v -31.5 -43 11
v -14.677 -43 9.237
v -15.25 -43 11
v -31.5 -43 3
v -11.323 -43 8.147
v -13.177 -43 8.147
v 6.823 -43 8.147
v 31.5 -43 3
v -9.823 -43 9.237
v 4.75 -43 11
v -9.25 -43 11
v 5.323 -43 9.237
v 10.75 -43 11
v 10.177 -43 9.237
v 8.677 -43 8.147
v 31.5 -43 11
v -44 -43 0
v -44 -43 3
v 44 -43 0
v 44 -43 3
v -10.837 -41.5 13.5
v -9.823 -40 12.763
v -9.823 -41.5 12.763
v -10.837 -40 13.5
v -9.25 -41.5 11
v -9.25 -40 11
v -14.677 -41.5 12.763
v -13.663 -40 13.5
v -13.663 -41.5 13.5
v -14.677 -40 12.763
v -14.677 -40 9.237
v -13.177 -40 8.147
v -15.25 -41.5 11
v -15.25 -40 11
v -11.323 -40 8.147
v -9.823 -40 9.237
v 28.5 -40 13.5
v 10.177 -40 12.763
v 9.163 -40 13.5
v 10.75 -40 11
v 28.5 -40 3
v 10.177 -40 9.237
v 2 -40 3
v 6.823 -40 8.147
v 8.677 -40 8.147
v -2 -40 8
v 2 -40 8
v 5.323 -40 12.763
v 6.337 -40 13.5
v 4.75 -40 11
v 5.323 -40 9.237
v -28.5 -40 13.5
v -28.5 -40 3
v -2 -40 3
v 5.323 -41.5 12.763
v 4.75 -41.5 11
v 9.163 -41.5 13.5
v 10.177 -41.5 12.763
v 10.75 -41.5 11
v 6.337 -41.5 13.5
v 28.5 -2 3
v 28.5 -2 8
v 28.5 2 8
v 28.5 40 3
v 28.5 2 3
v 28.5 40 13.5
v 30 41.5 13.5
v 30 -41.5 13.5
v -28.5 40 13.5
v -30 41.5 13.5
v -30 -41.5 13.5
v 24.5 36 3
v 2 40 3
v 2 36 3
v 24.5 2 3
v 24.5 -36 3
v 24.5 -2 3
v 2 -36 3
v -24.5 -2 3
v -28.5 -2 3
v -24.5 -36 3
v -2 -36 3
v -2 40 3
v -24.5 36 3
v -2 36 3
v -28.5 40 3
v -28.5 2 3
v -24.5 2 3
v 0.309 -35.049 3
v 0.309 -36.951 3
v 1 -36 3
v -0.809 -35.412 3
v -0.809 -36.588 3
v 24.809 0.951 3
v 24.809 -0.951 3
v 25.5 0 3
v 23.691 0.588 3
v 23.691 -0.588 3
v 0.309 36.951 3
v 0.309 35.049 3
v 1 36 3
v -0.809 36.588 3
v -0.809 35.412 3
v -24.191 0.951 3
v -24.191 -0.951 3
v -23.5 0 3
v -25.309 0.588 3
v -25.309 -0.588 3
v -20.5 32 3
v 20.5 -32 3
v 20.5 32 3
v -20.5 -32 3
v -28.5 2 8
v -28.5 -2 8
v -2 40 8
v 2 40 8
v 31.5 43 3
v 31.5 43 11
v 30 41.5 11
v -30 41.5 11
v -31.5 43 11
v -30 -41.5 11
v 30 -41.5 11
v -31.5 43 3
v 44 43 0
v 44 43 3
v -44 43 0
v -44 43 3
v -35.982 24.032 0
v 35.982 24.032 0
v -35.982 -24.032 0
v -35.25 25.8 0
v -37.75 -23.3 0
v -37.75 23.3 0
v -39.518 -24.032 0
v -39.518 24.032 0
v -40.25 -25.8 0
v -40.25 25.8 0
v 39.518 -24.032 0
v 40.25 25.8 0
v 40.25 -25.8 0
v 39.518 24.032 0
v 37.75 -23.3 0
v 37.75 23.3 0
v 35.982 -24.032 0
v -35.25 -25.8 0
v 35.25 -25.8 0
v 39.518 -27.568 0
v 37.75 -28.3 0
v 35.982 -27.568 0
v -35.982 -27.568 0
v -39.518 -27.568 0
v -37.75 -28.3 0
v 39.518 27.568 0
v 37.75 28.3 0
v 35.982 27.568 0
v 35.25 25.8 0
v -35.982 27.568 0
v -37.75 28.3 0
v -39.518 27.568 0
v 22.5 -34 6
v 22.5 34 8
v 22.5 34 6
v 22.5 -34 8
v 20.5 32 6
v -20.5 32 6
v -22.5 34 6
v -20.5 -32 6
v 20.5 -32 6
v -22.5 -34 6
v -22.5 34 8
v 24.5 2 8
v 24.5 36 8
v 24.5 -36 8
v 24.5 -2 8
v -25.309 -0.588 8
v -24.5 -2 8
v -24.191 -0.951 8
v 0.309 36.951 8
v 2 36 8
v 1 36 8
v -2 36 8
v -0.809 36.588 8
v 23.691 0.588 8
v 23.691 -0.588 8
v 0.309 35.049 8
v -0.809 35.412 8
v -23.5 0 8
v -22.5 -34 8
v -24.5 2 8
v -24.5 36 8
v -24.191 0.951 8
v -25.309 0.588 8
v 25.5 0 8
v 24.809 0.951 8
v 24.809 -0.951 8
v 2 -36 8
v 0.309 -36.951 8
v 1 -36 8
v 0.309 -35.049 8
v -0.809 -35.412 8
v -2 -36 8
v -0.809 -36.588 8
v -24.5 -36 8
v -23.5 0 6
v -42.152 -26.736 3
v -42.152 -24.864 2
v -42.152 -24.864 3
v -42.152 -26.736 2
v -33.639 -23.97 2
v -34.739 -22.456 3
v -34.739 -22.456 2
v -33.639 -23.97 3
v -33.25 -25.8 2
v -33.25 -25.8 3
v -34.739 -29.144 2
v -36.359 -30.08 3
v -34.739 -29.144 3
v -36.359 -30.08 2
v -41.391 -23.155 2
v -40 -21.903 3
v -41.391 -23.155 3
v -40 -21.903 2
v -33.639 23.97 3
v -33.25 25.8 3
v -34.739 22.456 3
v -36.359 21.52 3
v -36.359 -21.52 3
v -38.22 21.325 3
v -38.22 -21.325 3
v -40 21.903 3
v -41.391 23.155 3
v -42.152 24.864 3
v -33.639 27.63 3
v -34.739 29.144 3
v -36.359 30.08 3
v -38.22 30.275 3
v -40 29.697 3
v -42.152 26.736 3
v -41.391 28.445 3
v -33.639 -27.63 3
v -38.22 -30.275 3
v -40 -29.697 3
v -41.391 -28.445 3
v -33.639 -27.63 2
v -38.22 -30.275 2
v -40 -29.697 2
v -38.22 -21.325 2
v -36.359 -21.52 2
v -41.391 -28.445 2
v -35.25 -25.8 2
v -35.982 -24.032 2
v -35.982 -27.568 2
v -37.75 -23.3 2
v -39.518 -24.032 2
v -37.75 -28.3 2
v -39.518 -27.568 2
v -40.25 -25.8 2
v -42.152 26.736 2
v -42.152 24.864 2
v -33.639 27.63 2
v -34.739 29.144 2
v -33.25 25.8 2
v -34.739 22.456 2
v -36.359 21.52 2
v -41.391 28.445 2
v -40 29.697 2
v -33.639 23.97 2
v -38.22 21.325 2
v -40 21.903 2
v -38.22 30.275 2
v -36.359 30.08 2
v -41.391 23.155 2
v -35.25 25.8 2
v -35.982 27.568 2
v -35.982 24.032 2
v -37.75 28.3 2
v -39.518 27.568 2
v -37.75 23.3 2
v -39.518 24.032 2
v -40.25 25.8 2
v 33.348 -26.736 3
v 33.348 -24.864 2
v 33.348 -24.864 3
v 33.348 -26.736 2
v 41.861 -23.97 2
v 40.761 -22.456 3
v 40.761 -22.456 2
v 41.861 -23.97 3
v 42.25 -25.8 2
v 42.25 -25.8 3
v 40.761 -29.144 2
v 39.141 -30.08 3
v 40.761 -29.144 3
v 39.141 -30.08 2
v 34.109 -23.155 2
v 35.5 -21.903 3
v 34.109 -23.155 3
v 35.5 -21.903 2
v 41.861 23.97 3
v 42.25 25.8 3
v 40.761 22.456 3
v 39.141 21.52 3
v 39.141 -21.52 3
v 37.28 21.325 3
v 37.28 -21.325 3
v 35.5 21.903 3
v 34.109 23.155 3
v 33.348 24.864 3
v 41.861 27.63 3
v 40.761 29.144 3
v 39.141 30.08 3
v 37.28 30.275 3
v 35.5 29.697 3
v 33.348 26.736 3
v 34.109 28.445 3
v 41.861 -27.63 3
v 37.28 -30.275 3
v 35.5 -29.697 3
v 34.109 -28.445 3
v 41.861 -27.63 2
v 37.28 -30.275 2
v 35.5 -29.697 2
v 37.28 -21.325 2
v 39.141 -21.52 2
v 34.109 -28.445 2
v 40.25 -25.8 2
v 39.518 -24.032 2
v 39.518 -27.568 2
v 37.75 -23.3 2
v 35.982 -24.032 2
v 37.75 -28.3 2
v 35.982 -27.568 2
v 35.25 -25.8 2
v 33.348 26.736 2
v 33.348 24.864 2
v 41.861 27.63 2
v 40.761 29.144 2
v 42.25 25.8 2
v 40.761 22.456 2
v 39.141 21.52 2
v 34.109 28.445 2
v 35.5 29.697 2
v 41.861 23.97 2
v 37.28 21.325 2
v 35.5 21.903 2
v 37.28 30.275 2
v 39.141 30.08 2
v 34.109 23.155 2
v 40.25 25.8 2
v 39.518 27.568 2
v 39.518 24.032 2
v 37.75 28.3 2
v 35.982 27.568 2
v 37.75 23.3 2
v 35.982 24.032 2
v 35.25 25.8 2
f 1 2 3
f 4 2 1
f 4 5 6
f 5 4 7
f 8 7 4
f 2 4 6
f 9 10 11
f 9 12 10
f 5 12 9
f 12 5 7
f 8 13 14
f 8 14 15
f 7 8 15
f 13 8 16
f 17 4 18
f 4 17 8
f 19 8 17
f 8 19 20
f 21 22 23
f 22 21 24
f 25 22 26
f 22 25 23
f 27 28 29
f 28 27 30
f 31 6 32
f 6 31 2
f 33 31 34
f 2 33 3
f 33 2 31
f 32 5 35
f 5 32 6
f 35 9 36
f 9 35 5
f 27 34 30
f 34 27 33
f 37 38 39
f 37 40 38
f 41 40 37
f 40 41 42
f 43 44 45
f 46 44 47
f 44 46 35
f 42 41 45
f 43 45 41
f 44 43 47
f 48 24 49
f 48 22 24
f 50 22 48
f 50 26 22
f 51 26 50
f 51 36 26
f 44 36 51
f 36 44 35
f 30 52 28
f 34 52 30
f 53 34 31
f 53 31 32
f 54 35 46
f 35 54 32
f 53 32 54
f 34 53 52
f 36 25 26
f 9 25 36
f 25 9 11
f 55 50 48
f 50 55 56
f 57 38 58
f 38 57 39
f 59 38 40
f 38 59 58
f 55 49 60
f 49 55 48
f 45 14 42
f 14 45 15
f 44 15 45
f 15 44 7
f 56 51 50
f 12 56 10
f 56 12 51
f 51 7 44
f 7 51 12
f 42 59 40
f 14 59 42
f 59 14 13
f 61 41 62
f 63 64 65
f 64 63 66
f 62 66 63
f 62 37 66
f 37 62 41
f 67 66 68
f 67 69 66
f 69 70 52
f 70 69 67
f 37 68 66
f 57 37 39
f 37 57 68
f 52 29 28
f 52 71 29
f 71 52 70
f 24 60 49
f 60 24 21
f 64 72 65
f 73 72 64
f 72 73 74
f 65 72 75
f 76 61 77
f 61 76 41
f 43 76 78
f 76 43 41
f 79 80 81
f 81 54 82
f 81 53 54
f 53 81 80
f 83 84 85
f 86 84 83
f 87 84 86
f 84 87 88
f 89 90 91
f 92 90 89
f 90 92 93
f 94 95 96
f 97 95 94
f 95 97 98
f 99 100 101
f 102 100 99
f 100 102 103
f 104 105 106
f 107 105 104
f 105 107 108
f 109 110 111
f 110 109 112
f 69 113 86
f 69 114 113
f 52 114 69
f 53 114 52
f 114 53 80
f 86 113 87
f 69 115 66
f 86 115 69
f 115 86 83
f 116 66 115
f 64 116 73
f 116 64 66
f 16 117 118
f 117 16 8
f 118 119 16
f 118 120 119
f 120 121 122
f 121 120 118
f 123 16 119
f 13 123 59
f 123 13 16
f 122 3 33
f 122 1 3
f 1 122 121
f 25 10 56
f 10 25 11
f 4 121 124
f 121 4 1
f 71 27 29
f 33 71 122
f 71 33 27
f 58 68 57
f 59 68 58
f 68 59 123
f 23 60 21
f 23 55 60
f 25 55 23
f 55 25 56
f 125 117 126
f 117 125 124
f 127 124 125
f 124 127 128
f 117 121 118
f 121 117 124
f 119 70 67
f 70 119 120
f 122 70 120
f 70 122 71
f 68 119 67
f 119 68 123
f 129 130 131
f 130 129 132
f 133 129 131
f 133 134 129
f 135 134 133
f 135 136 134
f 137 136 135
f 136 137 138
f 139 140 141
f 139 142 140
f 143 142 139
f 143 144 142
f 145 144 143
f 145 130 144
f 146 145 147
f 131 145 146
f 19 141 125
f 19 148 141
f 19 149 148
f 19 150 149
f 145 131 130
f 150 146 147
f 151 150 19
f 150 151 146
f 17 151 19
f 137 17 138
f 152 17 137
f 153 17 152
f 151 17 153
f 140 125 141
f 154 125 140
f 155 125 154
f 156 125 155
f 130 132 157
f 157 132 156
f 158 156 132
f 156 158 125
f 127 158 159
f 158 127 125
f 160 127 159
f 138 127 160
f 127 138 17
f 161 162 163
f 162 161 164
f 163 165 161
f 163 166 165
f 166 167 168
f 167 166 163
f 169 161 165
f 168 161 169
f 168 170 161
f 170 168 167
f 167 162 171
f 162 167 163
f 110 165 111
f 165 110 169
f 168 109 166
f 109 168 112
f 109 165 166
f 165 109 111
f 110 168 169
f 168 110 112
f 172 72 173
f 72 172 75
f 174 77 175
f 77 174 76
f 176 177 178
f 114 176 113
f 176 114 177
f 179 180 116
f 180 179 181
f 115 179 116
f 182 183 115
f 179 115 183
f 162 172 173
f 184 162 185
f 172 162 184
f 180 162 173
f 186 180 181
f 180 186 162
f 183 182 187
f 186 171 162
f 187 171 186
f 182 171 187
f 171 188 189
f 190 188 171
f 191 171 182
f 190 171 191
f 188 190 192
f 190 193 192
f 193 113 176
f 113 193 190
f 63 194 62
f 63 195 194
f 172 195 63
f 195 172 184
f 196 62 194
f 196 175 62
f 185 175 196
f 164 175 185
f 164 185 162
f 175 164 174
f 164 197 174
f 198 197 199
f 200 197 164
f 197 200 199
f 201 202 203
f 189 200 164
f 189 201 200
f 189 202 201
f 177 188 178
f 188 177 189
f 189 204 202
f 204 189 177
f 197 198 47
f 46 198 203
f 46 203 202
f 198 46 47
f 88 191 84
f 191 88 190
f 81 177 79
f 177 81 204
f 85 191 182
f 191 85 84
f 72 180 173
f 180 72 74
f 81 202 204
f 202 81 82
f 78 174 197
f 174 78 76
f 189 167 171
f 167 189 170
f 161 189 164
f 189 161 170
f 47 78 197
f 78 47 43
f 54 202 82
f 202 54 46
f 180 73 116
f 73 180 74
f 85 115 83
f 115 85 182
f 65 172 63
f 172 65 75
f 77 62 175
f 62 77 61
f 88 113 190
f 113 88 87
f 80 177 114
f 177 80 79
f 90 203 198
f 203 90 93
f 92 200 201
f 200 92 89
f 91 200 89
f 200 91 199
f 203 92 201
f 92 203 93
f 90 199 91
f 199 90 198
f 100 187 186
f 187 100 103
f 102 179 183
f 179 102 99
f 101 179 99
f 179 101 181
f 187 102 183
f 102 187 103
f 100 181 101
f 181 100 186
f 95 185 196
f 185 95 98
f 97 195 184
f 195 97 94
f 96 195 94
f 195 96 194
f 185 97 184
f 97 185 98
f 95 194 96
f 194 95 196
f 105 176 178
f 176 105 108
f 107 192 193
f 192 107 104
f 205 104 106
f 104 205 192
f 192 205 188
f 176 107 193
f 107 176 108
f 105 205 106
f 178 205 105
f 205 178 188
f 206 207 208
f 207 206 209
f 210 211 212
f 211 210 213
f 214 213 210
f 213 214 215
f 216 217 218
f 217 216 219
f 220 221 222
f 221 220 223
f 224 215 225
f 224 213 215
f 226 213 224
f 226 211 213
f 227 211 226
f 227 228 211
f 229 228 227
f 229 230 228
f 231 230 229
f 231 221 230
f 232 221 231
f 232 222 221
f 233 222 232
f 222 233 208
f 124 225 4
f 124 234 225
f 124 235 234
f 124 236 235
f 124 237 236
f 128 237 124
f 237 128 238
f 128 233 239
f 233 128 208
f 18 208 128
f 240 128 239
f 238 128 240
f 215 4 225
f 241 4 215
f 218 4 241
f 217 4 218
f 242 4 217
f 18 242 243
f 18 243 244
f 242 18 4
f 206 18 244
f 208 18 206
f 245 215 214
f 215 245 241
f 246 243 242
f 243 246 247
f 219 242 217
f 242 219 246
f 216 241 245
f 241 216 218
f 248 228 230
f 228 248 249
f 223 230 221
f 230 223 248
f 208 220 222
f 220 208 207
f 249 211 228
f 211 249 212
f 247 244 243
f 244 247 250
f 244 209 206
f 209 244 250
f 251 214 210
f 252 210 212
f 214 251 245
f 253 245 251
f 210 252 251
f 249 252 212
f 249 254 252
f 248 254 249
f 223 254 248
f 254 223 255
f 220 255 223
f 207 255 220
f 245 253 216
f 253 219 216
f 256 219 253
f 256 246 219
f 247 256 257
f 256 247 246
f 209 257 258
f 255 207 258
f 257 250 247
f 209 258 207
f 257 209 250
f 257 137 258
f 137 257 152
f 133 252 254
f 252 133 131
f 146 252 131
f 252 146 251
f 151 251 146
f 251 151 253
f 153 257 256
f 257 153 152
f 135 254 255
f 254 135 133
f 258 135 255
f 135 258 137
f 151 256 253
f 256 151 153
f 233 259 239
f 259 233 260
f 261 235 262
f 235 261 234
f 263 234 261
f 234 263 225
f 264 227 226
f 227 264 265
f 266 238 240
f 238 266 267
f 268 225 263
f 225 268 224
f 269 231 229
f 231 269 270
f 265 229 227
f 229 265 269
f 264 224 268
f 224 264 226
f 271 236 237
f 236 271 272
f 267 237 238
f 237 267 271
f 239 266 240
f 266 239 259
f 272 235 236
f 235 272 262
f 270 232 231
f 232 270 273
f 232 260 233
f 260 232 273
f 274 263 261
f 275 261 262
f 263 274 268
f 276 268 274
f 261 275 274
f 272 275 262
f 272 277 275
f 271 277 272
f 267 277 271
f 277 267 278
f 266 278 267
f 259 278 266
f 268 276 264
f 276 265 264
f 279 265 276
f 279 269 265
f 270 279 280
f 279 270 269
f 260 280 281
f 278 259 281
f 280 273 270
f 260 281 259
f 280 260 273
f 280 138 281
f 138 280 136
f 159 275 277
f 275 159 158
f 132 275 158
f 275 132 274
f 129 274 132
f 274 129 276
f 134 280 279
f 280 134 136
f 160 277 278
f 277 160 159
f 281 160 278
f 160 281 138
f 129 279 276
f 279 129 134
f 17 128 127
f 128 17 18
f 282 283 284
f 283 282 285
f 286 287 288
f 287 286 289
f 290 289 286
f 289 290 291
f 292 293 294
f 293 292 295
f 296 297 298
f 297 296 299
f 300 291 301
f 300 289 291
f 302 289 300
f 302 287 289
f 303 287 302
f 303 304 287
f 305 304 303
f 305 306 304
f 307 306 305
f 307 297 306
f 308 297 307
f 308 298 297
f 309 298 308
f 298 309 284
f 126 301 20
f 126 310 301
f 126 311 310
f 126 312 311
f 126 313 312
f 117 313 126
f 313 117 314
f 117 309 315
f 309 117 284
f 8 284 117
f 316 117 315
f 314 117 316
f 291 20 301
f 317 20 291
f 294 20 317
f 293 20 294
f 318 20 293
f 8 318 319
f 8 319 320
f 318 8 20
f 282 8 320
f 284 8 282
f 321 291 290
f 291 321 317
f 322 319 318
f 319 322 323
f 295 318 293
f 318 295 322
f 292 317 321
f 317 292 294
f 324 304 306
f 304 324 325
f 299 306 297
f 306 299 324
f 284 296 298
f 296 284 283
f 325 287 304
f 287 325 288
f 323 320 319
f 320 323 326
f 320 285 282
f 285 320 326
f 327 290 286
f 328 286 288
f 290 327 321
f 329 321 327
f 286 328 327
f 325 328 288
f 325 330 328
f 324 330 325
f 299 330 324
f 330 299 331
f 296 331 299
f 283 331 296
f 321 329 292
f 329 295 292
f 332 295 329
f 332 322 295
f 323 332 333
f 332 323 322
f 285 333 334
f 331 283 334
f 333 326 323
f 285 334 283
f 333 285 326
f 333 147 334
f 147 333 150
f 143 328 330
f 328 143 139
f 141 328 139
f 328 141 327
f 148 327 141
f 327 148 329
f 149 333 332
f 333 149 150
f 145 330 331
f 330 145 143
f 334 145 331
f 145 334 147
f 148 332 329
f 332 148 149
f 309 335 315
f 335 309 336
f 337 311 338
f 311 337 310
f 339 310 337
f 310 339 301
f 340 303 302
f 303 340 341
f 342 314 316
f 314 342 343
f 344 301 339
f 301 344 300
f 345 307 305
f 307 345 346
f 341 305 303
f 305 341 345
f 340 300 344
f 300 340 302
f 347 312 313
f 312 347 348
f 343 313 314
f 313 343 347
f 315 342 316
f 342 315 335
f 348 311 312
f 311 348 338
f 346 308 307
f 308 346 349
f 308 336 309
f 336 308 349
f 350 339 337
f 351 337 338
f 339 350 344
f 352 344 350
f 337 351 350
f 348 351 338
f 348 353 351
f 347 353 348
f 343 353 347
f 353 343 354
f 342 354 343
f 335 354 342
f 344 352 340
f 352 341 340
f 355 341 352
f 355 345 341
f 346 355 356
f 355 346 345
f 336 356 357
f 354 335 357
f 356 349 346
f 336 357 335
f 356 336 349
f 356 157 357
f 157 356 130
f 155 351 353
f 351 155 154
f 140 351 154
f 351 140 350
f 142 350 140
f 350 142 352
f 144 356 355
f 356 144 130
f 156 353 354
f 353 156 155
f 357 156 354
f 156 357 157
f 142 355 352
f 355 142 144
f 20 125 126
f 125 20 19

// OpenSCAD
// CSG.scad - Basic example of CSG usage
//$fn=8; // draft
//$fn=50; // activate once happy with the design

// GENERATION OPTIONS

// set to 1 will generate upper box, 0 will skip it
generate_upper=0;
// set to 1 will generate lower box, 0 will skip it
generate_lower=1;

// DIMENSIONS //

// pcb dimensions, height with components
pcb = [45,68,15]; 
// just the PCB height, for the claming
pcb_height = 2; 

// WALLS //

// outer wall thickness
owt = 3; 
// inner wall thickness
iwt = 2; 

// Sidewall DRILLS //

// radius (!) of the drills
cable_drills = 3; 
// positions list on the bottom 
y_drills_bot = [10-22.25,30-22.25]; // position
// positions list on the top
y_drills_top = []; 
// positions list on the left side
x_drills_left = []; 
// positions list on the right side
x_drills_right = []; 

//////// LOWER box settings //////// 

// set to 1 if you want four claming blocks
with_clamping= 1;
// size of the clamping block
clamp_size = 4;
// radius(!) of the drill in the clamping block
clamp_size_drill = 1;

// free space under the PCB, e.g. for bottom side components
space_below = 3;

// number of extra standoffs under the pcb, increase for large pcb's
extra_standups = 0;

// set to 1 to add flanges to the box, e.g. to screw it on to something
with_flange = 1;

// flange drill size, radius(!) of the drill size
flange_drill = 2.5; // M5

/////// UPPER box settings //////

// radius (!) of the drills in the top, set to 0 for no drills 
lid_drill=0; 

// compensate shrinkage, positiv value will make the lid smaller, keep this small e.g. 0.25
shrinkage = 0;


// total height of both boxes musst be: top+pcb.z+space below+bottom=2*owt+pcb.z+space_below
// lower box out wall height is owt+(pcb.z/2+space_below)/2
// so upper box must be: otw+3/4*pcb.z+space_below/2

// total inner height is simply, pcb.z+space_below+2xowt
// lower box inner wall is: pcb.z/2+space_below+owt
// so upper box inner wall height is pcb.z/2+owt
// don't change
lower_box = [pcb.x+with_clamping*2*clamp_size+2*iwt+2*owt,pcb.y+with_clamping*2*clamp_size+2*iwt+2*owt,pcb.z/2+space_below+owt];

upper_box = [lower_box.x,lower_box.y,owt+pcb.z -(pcb_height+cable_drills)];

if(generate_upper){
    translate([lower_box.x+upper_box.x/2,0,0]) {  // comment this to flip the box on top of each other for testing
    //translate([0,0,upper_box.z+owt+iwt+space_below+cable_drills]) {  // uncomment this to flip the box on top of each other for testing
    //rotate([0,180,0]){// uncomment this to flip the box on top of each other for testing
        union(){
            difference(){
                // base cube
                translate([-upper_box.x/2,-upper_box.y/2,0]) {
                    cube(upper_box);
                }
                union(){
					// remove main inside
                    translate([-upper_box.x/2+owt,-upper_box.y/2+owt,owt]) {
                        cube([upper_box.x-2*owt,upper_box.y-2*owt,upper_box.z-owt]);
                    }
					// remove upper, smaller part
                    translate([-upper_box.x/2+1/2*owt-shrinkage,-upper_box.y/2+1/2*owt-shrinkage,owt+1/2*pcb.z]) {
                        cube([upper_box.x-owt+2*shrinkage,upper_box.y-owt+2*shrinkage,1/4*pcb.z+space_below/2]);
                    }
                    
                    if(lid_drill>0){
                        step_x=floor((upper_box.x-2*owt-2*lid_drill)/(lid_drill*3));
                        start_x=step_x/2*3*lid_drill;
                        
                        step_y=floor((upper_box.y-2*owt-2*lid_drill)/(lid_drill*3));
                        start_y=step_y/2*3*lid_drill;
                        
                        for(y = [0:1:step_y]){
                            for(x = [0:1:step_x]){
                                translate([-start_x+x*lid_drill*3,-start_y+y*lid_drill*3,0]){
                                    cylinder(h=owt, r=lid_drill);
                                }
                            }
                        }
                    }
                                    
                    // drills in the sizes
                    for(a = y_drills_bot){
                        translate([-a,-upper_box.y/2+owt,pcb.z-pcb_height]){
                            rotate([90,0,0]){
                                cylinder(h=owt, r=cable_drills);
                            }
                        }
                    }
                    for(b = y_drills_top){
                        translate([-b,+upper_box.y/2,pcb.z-pcb_height]){
                            rotate([90,0,0]){
                                cylinder(h=owt, r=cable_drills);
                            }
                        }
                    }
                    for(b = x_drills_left){
                        translate([upper_box.x/2-owt,b,pcb.z-pcb_height]){
                            rotate([0,90,0]){
                                cylinder(h=owt, r=cable_drills);
                            }
                        }
                    }
                    for(b = x_drills_right){
                        translate([-upper_box.x/2,b,pcb.z-pcb_height]){
                            rotate([0,90,0]){
                                cylinder(h=owt, r=cable_drills);
                            }
                        }
                    }
                }
            }
        }
    //}// uncomment this to flip the box on top of each other for testing
    //}// uncomment this to flip the box on top of each other for testing
    }
}

if(generate_lower){
    // lower box
    union(){
        difference(){ // base box - (inner cube - walls around)
            union(){
                // base cube
                translate([-lower_box.x/2,-lower_box.y/2,0]) {
                    cube(lower_box);
                }
            }
            
            union(){
                // inner cube
                translate([-(lower_box.x/2-owt),-(lower_box.y/2-owt),owt]) {
                    cube([lower_box.x-owt*2,lower_box.y-owt*2,lower_box.z-owt]);
                }
                // remove 4 half - walls
                translate([-lower_box.x/2,-lower_box.y/2,space_below+pcb_height+owt+cable_drills]) {
                    cube([lower_box.x,owt/2,pcb.z/2-(pcb_height+cable_drills)]);
                }
                translate([-lower_box.x/2,lower_box.y/2-owt/2,space_below+pcb_height+owt+cable_drills]) {
                    cube([lower_box.x,owt/2,pcb.z/2-(pcb_height+cable_drills)]);
                }
                translate([-lower_box.x/2,-lower_box.y/2-owt/2,space_below+pcb_height+owt+cable_drills]) {
                    cube([owt/2,lower_box.y,pcb.z/2-(pcb_height+cable_drills)]);
                }
                translate([lower_box.x/2-owt/2,-lower_box.y/2-owt/2,space_below+pcb_height+owt+cable_drills]) {
                    cube([owt/2,lower_box.y,pcb.z/2-(pcb_height+cable_drills)]);
                }
                
                // drills for cable
                for(a = y_drills_bot){
                    translate([a,-lower_box.y/2+owt,cable_drills+space_below+pcb_height+owt]){
                        rotate([90,0,0]){
                            cylinder(h=owt, r=cable_drills);
                        }
                    }
                }
                for(b = y_drills_top){
                    translate([b,+lower_box.y/2,cable_drills+space_below+pcb_height+owt]){
                        rotate([90,0,0]){
                            cylinder(h=owt, r=cable_drills);
                        }
                    }
                }
                for(b = x_drills_left){
                    translate([-lower_box.x/2,b,cable_drills+space_below+pcb_height+owt]){
                        rotate([0,90,0]){
                            cylinder(h=owt, r=cable_drills);
                        }
                    }
                }
                for(b = x_drills_right){
                    translate([lower_box.x/2-owt,b,cable_drills+space_below+pcb_height+owt]){
                        rotate([0,90,0]){
                            cylinder(h=owt, r=cable_drills);
                        }
                    }
                }
                // end if drills for cable
            } // end of union
        } // end of difference, outer box done.
        
        // inner parts // 
        
        // stand off 
        translate([-pcb.x/2,-pcb.y/2,owt]){
            // outer frame, directly under the border of the PCB
            difference(){
                cube([pcb.x,pcb.y,space_below]);
                translate([iwt,iwt,0]){
                    cube([pcb.x-2*iwt,pcb.y-2*iwt,space_below]);
                }
            }
            // add support standoffs if extra_standoffs > 0
            for(a = [0:1:extra_standups]){
                translate([a*pcb.x/(extra_standups+1)-iwt/2,0,0]){
                    cube([iwt,pcb.y,space_below]);
                }
                translate([0,a*pcb.y/(extra_standups+1)-iwt/2,0]){
                    cube([pcb.x,iwt,space_below]);
                }
            }
            
        }

        // (frame around stand off + clamping) - drills
        difference(){ 
            union(){
                // frame around standoff
                translate([-pcb.x/2-iwt,-pcb.y/2-iwt,owt]){
                    difference(){
                        cube([pcb.x+2*iwt,pcb.y+2*iwt,space_below+pcb_height]);
                        translate([iwt,iwt,0]){
                            cube([pcb.x,pcb.y,space_below+pcb_height]);
                        }
                    }
                }
                // blocks for claming
                if(with_clamping){
                    // bottom
                    translate([-clamp_size/2,-pcb.y/2-clamp_size-iwt,owt]){
                        cube([clamp_size,clamp_size,space_below+pcb_height]);
                    }
                    // top
                    translate([-clamp_size/2,+pcb.y/2+iwt,owt]){
                        cube([clamp_size,clamp_size,space_below+pcb_height]);
                    }
                    // right
                    translate([+pcb.x/2+iwt,-clamp_size/2,owt]){
                        cube([clamp_size,clamp_size,space_below+pcb_height]);
                    }
                    // left
                    translate([-pcb.x/2-iwt-clamp_size,-clamp_size/2,owt]){
                        cube([clamp_size,clamp_size,space_below+pcb_height]);
                    }
                } // end of blocks 
            }
            // drills in claming blocks
            if(with_clamping && clamp_size_drill>0){
                union(){
                    // bottom
                    translate([0,-pcb.y/2-iwt,owt]){
                        cylinder(h=space_below+pcb_height, r=clamp_size_drill);
                    }
                    // top
                    translate([0,+pcb.y/2+iwt,owt]){
                        cylinder(h=space_below+pcb_height, r=clamp_size_drill);
                    }
                    // right
                    translate([+pcb.x/2+iwt,0,owt]){
                        cylinder(h=space_below+pcb_height, r=clamp_size_drill);
                    }
                    // left
                    translate([-pcb.x/2-iwt,0,owt]){
                        cylinder(h=space_below+pcb_height, r=clamp_size_drill);
                    }
                } // drill union
            } // end of drills
        } // difference
        
        // add falge
        // radius of screw = flange_drill. Screw head radius is ~1.8x screw radius. lets say 2.5 to give some space
        if(with_flange){
            union(){
                flange_pos_x = [-lower_box.x/2-2*2.5*flange_drill,+lower_box.x/2];
                for(p=flange_pos_x){
                    translate([p,-lower_box.y/2,0]){
                        difference(){
                            cube([2*2.5*flange_drill,lower_box.y,owt]);
                            // upper screw
                            translate([2.5*flange_drill,lower_box.y/5,0]){
                                // head sink
                                translate([0,0,owt/3*2]){
                                    cylinder(h=owt/3, r=flange_drill*1.8);
                                }
                                // throughhole
                                cylinder(h=owt, r=flange_drill);
                            }
                            // lower screw
                            translate([2.5*flange_drill,lower_box.y*4/5,0]){
                                // head sink
                                translate([0,0,owt/3*2]){
                                    cylinder(h=owt/3, r=flange_drill*1.8);
                                }
                                // throughhole
                                cylinder(h=owt, r=flange_drill);
                            }
                        } // remove screw holes from flange
                    } // left and right
                } // for the two positions
            } // union, needed?
        } // if with flange
        
    }
}
